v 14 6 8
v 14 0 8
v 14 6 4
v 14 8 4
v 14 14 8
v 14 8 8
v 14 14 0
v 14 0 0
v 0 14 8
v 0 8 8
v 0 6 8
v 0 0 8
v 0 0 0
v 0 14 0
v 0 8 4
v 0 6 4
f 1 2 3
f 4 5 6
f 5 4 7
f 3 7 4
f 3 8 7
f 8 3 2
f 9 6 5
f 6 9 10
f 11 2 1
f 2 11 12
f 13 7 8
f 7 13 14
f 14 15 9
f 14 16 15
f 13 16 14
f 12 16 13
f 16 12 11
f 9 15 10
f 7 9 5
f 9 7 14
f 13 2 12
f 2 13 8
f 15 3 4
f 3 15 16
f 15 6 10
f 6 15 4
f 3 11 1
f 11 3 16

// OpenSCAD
$fn = 32;

// ----------------------------------------------------------------------
// Micro clip: slotted block, 5-20 mm class
// ----------------------------------------------------------------------

// --- parameters (mm) ---
block_l = 14;             // block length, X
block_w = 14;             // block width, Y
block_h = 8;              // block height, Z
slot_w = 2;               // slot width
slot_d = 4;               // slot depth from the top

difference() {
  cube([block_l, block_w, block_h]);
  translate([-1, block_w / 2 - slot_w / 2, block_h - slot_d])
    cube([block_l + 2, slot_w, slot_d + 1]);
}
